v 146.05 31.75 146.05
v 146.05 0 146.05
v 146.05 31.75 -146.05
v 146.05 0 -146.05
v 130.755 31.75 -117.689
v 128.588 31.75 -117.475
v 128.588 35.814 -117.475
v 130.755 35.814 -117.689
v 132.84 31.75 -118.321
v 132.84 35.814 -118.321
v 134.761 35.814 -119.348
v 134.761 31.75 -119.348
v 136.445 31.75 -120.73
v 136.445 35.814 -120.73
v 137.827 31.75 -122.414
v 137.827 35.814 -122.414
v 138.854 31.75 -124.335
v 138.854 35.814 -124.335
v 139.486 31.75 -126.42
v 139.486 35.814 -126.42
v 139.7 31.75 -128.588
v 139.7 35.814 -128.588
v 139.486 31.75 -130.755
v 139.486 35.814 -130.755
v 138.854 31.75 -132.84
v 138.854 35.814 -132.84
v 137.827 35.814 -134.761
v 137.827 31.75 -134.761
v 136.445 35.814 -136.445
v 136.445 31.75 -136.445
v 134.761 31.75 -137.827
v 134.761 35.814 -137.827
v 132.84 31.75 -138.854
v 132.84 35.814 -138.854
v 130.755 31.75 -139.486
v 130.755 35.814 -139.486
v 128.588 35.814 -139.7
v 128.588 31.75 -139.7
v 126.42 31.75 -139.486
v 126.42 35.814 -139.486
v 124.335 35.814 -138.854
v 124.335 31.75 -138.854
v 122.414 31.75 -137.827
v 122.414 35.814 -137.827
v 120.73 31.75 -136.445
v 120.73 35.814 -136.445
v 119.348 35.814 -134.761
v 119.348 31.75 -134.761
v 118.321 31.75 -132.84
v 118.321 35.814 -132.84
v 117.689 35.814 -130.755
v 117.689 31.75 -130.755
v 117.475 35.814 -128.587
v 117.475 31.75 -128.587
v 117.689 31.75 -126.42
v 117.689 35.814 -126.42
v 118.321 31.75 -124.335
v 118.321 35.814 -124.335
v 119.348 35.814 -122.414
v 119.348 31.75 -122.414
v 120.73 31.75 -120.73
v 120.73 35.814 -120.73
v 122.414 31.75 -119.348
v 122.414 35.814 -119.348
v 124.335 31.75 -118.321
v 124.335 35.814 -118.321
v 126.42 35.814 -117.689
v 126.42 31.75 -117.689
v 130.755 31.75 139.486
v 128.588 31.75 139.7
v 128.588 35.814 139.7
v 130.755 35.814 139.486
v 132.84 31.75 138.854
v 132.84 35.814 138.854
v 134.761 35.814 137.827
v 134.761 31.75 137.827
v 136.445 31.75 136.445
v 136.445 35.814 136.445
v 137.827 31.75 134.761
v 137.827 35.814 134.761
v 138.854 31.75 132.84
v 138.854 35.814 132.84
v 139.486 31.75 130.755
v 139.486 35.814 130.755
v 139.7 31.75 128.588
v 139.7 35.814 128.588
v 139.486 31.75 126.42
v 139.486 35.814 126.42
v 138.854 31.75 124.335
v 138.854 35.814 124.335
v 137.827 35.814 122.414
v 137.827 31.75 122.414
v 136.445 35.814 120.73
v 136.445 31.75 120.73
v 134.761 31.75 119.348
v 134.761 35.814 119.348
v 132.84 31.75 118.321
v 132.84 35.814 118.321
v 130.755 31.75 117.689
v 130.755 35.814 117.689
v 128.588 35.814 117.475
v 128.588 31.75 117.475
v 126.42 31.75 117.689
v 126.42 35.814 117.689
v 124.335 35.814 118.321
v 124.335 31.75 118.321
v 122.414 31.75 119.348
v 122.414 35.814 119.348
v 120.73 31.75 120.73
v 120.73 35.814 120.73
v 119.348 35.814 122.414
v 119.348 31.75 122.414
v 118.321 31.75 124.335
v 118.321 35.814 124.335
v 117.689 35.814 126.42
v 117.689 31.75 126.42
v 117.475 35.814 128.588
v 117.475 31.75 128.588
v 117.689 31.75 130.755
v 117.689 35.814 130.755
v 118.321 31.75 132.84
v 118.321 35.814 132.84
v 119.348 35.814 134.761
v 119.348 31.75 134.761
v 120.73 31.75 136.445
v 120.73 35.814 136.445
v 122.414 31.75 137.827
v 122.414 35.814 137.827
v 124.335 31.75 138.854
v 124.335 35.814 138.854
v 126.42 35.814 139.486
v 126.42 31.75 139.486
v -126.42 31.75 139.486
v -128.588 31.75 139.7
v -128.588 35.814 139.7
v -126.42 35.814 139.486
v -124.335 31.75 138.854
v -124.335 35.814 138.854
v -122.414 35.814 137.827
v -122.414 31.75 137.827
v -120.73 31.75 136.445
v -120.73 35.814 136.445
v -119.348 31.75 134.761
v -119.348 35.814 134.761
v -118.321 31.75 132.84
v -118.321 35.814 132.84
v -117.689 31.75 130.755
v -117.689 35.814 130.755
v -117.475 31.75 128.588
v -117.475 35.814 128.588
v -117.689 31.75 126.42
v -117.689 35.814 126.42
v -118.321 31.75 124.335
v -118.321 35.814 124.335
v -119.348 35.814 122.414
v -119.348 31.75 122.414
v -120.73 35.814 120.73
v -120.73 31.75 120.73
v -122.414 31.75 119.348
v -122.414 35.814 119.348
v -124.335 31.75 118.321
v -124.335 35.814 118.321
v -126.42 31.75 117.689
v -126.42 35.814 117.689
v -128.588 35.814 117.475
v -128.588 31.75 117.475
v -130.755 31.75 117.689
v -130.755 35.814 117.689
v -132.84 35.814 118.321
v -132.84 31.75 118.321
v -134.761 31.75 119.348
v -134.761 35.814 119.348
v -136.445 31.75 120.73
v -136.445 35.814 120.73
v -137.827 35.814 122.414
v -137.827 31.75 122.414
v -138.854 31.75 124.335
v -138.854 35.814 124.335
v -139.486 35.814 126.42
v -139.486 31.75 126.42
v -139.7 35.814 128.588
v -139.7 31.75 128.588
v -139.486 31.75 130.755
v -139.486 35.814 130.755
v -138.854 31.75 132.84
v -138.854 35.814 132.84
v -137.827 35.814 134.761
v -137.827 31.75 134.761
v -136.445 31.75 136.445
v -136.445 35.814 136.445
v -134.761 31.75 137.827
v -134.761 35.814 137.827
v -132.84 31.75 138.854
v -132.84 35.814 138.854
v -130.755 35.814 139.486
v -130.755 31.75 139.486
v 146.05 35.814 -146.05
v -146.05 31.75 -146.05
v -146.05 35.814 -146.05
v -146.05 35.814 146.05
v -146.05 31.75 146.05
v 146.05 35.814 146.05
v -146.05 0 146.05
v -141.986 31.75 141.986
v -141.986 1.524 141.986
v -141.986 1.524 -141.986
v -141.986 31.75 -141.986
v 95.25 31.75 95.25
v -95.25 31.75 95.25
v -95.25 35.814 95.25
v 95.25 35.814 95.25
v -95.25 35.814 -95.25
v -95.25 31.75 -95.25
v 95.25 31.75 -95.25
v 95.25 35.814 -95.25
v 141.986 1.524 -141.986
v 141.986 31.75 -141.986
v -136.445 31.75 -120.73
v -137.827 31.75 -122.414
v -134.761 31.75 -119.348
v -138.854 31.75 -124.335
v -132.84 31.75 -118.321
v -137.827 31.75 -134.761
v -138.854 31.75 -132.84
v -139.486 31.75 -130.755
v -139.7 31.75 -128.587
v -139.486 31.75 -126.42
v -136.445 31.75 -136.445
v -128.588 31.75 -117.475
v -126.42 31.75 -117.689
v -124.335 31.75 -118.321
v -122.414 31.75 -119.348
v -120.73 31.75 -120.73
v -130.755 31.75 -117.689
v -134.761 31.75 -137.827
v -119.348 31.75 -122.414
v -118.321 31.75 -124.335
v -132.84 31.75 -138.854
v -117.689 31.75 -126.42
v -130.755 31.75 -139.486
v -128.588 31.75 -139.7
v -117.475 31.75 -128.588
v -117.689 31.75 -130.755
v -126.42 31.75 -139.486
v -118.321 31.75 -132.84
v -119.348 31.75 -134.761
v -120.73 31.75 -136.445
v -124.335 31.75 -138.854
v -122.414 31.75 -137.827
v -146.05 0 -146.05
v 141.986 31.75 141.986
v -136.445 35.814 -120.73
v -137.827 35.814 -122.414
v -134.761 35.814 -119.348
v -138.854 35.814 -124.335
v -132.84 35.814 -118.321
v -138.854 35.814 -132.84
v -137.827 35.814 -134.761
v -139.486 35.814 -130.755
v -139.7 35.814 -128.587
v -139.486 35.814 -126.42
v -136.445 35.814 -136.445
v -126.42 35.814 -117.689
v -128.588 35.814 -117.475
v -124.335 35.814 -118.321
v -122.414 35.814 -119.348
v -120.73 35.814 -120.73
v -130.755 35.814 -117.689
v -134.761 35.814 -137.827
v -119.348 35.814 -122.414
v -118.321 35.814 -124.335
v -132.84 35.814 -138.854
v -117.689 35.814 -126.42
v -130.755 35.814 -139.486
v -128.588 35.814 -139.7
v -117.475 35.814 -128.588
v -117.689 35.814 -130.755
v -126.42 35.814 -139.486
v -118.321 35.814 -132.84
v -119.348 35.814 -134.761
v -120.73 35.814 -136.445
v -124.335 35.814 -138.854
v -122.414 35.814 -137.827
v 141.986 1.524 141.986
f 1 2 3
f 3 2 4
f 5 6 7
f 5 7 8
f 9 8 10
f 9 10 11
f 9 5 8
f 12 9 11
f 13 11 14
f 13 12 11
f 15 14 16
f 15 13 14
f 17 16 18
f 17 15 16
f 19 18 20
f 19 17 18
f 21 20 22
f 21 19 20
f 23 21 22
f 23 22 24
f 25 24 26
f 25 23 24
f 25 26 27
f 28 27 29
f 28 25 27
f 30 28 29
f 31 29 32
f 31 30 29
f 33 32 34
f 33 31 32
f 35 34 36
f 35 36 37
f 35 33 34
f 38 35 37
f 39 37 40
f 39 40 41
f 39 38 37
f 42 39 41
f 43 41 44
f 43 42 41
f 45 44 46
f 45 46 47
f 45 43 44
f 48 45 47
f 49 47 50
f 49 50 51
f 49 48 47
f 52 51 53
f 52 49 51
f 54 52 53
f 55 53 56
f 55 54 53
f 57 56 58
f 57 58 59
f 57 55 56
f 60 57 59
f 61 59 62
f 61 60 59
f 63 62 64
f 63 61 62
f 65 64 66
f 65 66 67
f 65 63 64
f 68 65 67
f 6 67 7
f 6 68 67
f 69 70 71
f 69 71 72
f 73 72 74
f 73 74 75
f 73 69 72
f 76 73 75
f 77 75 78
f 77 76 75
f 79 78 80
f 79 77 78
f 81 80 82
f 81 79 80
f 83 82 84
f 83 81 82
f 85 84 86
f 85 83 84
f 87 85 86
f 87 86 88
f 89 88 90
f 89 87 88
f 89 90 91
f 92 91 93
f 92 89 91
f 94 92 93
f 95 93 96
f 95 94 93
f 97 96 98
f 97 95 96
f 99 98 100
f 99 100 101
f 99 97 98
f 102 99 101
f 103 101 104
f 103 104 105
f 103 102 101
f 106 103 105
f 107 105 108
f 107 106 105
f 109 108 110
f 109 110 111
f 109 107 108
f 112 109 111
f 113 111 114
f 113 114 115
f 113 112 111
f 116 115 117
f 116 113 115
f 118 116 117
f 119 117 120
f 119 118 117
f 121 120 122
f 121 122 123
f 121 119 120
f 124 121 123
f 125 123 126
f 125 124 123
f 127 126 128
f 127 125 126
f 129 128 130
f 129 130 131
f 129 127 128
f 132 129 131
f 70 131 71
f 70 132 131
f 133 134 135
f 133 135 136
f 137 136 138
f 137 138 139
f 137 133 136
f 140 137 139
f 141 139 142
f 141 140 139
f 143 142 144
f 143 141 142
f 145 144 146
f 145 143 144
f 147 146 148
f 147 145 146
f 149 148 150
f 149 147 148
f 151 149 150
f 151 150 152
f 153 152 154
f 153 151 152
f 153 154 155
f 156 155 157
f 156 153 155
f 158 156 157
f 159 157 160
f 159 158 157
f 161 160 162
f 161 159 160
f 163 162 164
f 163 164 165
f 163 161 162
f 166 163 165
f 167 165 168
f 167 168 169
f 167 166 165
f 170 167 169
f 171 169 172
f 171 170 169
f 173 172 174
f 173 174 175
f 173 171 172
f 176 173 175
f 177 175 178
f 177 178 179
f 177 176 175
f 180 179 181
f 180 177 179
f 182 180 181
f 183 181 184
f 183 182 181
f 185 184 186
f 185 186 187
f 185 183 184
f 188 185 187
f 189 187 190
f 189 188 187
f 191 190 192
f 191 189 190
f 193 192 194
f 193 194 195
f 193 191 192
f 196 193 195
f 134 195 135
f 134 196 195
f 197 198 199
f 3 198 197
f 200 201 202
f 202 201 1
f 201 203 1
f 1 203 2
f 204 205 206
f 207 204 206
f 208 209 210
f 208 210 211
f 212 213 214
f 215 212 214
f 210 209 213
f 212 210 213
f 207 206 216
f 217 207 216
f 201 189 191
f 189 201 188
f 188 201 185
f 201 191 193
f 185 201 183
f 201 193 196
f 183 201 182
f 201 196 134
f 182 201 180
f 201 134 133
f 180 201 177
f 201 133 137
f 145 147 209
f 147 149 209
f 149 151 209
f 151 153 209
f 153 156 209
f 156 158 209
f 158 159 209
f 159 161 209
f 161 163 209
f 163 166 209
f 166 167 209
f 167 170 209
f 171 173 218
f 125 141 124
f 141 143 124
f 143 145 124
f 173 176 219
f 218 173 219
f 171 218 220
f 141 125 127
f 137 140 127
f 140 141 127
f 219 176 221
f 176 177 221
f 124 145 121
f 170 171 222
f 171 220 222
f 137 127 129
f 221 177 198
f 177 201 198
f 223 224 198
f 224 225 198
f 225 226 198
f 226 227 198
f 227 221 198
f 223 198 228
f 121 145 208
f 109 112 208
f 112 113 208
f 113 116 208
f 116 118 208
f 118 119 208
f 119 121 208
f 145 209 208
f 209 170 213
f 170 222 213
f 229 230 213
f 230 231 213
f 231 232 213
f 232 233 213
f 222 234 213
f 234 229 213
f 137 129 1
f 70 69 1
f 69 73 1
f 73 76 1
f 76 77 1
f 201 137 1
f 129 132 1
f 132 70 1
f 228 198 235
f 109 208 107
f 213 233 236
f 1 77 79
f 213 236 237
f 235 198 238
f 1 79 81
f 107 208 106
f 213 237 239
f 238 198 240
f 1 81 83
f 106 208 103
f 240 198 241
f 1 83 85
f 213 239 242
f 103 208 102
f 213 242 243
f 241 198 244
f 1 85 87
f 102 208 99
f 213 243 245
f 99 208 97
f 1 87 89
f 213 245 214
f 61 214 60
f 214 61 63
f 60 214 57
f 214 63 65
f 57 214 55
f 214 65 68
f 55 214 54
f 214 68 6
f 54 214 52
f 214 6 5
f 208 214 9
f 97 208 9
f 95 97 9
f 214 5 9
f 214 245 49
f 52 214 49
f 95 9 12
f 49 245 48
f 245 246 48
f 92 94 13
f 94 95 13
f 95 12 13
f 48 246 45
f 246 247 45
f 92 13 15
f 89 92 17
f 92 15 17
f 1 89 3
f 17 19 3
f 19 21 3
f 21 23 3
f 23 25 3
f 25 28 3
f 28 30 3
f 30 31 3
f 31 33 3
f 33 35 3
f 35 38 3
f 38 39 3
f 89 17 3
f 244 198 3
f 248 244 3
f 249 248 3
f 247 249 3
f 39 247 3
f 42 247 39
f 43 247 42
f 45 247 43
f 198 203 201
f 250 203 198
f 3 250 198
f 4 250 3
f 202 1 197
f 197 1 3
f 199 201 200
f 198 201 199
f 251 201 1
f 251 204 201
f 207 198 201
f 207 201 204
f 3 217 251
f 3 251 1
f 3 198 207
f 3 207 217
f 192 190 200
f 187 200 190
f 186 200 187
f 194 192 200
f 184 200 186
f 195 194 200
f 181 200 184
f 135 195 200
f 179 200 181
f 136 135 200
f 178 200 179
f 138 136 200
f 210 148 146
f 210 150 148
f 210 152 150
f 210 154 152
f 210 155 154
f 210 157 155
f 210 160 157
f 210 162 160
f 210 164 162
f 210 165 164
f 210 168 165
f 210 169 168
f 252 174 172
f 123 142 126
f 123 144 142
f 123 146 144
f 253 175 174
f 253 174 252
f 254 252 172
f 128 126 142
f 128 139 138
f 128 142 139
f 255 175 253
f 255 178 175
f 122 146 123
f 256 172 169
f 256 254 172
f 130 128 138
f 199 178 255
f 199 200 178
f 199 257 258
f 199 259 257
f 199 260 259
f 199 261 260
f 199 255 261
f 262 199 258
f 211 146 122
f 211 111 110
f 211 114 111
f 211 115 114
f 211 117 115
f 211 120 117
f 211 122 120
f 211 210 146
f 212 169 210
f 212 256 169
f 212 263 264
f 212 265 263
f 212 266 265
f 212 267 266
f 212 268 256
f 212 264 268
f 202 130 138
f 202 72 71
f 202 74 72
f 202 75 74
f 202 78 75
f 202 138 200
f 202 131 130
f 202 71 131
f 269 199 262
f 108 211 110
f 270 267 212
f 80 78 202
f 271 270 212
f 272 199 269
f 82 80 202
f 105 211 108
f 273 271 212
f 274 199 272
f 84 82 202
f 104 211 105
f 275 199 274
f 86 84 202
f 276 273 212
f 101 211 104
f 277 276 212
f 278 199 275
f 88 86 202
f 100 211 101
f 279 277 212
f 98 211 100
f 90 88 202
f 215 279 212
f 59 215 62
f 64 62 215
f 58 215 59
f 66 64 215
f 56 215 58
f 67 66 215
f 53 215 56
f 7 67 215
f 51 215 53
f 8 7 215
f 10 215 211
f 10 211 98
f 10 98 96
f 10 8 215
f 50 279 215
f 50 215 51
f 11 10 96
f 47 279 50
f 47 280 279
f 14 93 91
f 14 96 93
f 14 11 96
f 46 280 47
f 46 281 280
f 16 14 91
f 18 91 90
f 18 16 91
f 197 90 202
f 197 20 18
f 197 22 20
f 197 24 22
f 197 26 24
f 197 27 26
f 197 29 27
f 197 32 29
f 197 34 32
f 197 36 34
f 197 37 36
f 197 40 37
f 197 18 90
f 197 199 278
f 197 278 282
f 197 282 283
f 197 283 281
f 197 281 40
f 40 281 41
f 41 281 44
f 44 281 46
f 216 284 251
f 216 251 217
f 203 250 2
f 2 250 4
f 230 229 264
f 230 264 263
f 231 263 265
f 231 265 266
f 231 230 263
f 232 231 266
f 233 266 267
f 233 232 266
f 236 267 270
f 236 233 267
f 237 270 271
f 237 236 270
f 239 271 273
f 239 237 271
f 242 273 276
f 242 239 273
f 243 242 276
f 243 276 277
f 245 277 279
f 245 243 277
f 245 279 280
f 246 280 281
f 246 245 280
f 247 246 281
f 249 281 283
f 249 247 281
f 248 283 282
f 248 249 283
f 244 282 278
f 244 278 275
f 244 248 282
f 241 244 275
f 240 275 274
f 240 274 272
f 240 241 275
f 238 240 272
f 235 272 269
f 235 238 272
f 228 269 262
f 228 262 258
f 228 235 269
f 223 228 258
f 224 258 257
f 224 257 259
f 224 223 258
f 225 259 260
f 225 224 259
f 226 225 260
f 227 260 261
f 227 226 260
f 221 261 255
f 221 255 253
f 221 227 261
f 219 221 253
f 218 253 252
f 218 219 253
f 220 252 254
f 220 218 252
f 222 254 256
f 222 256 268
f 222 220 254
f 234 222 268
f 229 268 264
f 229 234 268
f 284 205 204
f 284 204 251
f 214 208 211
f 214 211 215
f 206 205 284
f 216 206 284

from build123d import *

# Parameters (mm, degrees)
SKETCH1_W           = 292.1
SKETCH1_H           = 292.1
SKETCH1_W_2         = 283.972
SKETCH1_H_2         = 283.972
BOSS_EXTRUDE1_DEPTH = 31.75
SKETCH2_W           = 292.1
SKETCH2_H           = 292.1
BOSS_EXTRUDE2_DEPTH = 1.524
SKETCH3_W           = 292.1
SKETCH3_H           = 292.1
SKETCH3_R           = 11.1125
SKETCH3_W_2         = 190.5
SKETCH3_H_2         = 190.5
BOSS_EXTRUDE3_DEPTH = 4.064


with BuildPart() as part:
    # Sketch1 → Boss-Extrude1 (new body)
    with BuildSketch(Plane(origin=(0, 0, 0), x_dir=(1, 0, 0), z_dir=(0, 1, 0))):
        Rectangle(SKETCH1_W, SKETCH1_H)
        Rectangle(SKETCH1_W_2, SKETCH1_H_2, mode=Mode.SUBTRACT)
    extrude(amount=BOSS_EXTRUDE1_DEPTH)

    # Sketch2 → Boss-Extrude2 (add)
    with BuildSketch(Plane.XZ):
        Rectangle(SKETCH2_W, SKETCH2_H)
    extrude(amount=-BOSS_EXTRUDE2_DEPTH)


with BuildPart() as body_2:
    # Sketch3 → Boss-Extrude3 (new body)
    with BuildSketch(Plane(origin=(0, 31.75, 0), x_dir=(1, 0, 0), z_dir=(0, 1, 0))):
        Rectangle(SKETCH3_W, SKETCH3_H)
        with Locations(Location((-128.5875, 128.5875, 0), (0, 0, 270))):
            Circle(SKETCH3_R, mode=Mode.SUBTRACT)
        with Locations(Location((-128.5875, -128.5875, 0), (0, 0, 270))):
            Circle(SKETCH3_R, mode=Mode.SUBTRACT)
        with Locations(Location((128.5875, -128.5875, 0), (0, 0, 270))):
            Circle(SKETCH3_R, mode=Mode.SUBTRACT)
        with Locations(Location((128.5875, 128.5875, 0), (0, 0, 270))):
            Circle(SKETCH3_R, mode=Mode.SUBTRACT)
        Rectangle(SKETCH3_W_2, SKETCH3_H_2, mode=Mode.SUBTRACT)
    extrude(amount=BOSS_EXTRUDE3_DEPTH)


solid = Compound([part.part, body_2.part])
